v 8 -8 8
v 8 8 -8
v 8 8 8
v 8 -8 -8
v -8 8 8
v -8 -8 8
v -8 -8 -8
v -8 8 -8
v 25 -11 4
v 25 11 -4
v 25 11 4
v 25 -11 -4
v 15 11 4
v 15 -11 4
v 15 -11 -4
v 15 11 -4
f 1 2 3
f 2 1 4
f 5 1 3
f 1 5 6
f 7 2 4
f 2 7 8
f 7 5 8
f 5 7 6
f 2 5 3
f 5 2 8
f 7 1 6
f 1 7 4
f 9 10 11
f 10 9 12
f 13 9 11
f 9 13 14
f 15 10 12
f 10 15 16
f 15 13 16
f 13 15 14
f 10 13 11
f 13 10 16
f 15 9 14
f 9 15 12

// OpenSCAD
union(){
  translate([0, 0, 0]) cube([16, 16, 16], center=true);
  translate([20, 0, 0]) cube([10, 22, 8], center=true);
}
